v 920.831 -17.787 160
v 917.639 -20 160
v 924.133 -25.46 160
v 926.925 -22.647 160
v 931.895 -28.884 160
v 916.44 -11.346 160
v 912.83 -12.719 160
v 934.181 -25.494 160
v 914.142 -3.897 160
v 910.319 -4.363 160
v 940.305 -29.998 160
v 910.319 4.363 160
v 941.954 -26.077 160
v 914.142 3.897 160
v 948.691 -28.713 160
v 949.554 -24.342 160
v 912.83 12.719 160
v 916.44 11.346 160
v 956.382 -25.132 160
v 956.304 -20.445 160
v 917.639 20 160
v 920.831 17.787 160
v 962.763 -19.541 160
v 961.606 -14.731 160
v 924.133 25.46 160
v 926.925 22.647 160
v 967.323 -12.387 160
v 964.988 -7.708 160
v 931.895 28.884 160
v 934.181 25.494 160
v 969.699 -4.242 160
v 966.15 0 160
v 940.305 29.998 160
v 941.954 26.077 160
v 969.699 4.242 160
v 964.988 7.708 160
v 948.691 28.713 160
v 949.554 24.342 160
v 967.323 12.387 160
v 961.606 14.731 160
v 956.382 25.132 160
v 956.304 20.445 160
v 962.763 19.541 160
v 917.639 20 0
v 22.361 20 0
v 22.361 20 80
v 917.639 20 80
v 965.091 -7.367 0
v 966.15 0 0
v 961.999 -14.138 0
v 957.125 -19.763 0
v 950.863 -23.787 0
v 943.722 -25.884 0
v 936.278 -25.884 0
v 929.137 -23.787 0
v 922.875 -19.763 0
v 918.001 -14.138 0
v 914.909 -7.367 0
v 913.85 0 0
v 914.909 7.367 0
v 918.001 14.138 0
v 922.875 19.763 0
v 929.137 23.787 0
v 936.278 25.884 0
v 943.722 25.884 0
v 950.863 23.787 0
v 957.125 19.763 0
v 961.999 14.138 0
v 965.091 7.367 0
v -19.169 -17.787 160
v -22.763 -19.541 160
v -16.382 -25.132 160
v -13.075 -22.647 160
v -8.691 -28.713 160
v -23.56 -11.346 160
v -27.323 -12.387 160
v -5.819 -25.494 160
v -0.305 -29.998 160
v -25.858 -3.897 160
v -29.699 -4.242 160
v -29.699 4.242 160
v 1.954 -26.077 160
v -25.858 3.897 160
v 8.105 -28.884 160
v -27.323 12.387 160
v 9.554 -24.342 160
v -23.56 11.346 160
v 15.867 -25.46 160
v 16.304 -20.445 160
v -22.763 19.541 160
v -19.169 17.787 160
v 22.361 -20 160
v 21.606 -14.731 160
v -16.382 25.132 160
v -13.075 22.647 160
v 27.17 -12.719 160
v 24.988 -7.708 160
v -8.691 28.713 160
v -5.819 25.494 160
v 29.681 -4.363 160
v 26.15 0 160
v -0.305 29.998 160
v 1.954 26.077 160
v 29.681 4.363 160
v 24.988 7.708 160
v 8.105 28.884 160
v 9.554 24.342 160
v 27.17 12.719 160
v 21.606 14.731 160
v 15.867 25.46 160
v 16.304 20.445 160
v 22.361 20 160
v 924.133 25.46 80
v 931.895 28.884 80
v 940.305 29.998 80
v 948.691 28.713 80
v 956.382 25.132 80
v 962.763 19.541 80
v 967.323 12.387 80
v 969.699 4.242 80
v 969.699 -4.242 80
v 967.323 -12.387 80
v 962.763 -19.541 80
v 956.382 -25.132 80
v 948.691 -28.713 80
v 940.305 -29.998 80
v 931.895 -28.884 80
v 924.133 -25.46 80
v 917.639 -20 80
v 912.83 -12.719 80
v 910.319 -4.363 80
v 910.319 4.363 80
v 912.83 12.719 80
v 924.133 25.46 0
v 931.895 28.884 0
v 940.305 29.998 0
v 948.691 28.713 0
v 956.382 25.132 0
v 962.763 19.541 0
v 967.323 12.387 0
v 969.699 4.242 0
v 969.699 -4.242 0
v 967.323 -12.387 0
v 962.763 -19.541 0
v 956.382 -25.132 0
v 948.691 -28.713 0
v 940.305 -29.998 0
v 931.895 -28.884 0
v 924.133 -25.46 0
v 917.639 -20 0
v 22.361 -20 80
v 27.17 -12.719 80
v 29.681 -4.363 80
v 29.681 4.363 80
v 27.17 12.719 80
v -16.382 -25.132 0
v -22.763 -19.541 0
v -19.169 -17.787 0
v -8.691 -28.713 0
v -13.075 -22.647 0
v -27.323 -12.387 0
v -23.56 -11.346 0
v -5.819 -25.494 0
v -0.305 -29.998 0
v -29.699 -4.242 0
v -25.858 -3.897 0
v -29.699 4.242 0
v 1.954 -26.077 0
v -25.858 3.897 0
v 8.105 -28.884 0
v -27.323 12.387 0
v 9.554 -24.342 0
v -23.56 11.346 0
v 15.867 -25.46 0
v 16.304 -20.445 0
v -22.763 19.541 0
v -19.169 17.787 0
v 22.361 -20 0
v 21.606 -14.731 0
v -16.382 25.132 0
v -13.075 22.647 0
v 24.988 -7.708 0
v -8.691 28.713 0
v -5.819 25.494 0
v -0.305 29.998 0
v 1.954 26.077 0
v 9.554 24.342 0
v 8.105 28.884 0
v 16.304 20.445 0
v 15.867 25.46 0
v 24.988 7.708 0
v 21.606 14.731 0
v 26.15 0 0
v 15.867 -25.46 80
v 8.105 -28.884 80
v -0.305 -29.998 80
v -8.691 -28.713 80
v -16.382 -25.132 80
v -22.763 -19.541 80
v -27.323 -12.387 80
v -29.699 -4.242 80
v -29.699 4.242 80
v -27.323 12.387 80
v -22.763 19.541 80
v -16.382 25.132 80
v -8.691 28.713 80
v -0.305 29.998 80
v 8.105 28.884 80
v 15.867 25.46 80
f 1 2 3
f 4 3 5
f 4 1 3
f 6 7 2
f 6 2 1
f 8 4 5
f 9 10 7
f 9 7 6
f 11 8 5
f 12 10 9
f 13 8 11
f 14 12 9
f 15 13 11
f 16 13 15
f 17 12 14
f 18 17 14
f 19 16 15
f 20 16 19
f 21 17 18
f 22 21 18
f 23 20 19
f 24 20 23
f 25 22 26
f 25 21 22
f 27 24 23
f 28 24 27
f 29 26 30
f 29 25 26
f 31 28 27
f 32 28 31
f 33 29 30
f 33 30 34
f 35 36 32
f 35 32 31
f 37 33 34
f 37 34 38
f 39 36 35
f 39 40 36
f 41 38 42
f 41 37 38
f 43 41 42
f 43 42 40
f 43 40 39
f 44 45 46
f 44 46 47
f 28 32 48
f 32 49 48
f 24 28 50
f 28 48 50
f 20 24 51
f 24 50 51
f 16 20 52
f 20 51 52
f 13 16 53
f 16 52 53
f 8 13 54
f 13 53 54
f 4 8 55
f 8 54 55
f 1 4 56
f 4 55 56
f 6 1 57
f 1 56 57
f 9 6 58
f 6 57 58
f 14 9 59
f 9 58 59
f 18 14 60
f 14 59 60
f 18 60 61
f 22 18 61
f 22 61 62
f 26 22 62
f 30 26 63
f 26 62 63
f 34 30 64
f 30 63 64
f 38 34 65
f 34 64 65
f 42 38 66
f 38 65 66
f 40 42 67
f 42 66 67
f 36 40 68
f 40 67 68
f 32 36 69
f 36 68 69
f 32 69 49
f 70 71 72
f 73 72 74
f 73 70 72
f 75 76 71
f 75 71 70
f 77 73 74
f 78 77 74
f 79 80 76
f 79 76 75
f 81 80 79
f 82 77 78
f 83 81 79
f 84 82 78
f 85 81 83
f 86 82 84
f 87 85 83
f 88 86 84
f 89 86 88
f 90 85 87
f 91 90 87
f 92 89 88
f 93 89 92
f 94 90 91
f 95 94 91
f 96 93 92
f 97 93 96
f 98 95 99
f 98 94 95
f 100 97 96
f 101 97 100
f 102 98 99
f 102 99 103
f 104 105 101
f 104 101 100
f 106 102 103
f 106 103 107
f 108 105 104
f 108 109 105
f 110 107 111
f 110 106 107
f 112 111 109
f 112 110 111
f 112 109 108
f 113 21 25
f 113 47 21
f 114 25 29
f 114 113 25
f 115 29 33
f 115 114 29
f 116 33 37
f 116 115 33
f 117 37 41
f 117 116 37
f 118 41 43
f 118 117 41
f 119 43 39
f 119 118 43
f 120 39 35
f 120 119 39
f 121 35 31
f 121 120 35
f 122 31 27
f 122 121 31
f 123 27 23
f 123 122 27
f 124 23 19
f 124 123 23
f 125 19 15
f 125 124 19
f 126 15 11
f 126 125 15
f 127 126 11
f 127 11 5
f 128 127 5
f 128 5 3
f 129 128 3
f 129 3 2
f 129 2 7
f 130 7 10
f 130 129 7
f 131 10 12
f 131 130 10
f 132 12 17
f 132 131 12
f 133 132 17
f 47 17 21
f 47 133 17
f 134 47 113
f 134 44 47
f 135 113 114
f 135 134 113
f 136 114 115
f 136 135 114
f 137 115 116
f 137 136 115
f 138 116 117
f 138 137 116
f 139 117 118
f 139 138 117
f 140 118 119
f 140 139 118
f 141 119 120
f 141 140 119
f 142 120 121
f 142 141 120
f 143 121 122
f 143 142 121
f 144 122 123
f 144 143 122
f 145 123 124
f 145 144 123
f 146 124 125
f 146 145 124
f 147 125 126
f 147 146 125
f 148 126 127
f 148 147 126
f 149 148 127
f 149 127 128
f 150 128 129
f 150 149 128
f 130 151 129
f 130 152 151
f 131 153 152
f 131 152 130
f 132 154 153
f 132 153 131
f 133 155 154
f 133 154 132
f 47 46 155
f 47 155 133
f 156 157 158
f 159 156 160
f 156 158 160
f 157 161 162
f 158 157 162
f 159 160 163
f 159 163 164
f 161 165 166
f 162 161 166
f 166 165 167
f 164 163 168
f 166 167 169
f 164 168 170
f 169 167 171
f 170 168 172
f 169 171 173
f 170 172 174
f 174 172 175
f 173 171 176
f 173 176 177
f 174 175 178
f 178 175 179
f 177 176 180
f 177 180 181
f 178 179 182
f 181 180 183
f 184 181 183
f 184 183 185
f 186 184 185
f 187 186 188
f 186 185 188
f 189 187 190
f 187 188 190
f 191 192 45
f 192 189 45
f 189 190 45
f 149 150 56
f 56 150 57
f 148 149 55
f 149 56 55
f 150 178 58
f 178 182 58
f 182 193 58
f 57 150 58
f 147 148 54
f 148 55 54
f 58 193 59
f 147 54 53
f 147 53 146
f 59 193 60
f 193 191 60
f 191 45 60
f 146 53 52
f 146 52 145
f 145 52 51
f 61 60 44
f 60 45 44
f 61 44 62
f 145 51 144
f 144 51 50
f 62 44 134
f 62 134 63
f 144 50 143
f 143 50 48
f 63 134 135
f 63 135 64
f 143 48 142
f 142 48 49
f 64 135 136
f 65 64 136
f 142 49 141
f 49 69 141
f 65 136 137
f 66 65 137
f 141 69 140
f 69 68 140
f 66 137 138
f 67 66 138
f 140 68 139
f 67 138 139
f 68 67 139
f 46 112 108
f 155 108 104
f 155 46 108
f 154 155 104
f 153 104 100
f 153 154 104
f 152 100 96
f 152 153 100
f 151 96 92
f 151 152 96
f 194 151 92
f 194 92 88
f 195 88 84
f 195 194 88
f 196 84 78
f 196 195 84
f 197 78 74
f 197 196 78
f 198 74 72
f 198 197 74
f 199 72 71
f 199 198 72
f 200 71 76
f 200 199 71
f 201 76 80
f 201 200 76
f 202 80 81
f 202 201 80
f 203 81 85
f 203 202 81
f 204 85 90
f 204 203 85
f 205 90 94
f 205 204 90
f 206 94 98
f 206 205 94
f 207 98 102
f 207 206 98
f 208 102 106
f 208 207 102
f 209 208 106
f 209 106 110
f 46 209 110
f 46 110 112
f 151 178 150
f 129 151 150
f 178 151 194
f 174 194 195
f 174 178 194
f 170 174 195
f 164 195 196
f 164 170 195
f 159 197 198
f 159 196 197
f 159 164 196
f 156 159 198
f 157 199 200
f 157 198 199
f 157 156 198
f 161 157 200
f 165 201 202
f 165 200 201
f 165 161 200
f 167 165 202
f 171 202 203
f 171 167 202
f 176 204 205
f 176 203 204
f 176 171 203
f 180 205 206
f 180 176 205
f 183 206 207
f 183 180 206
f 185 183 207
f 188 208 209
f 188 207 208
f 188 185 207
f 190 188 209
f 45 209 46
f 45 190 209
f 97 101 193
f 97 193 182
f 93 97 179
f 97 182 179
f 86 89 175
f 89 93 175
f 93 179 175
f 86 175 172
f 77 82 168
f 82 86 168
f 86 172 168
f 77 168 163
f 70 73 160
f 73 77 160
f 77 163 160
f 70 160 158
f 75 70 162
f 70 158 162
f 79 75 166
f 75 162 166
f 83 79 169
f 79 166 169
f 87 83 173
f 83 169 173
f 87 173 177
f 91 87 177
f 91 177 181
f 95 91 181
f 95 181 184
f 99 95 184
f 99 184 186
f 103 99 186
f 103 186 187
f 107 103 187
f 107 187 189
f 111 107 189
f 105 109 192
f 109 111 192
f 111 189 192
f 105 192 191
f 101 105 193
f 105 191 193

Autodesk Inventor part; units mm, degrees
ref_plane "YZ Plane" through (0, 0, 0) normal (1, 0, 0) x (0, 1, 0)
ref_plane "XZ Plane" through (0, 0, 0) normal (0, 1, 0) x (-1, 0, 0)
ref_plane "XY Plane" through (0, 0, 0) normal (0, 0, 1) x (1, 0, 0)
sketch "Boceto1" plane through (0, 0, 0) normal (0, 0, 1) x (1, 0, 0)
  circle A0 centre (0, 0) radius 30
  circle A1 centre (0, 0) radius 26.15
  circle A2 centre (940, 0) radius 30
  circle A3 centre (940, 0) radius 26.15
  line L0 (22.3607, -20) -> (917.6393, -20)
  line L1 (26.15, 0) -> (30, 0)
  line L2 (910, 0) -> (940, 0)
  line L3 (22.3607, 20) -> (917.6393, 20)
  dimension "d1" = 52.3
  dimension "d0" = 60
  dimension "d2" = 940
  dimension "d3" = 60
  dimension "d4" = 52.3
extrude "Extrusión1" add sketch "Boceto1" along normal blind 80
sketch "Boceto2" plane through (0, 0, 80) normal (0, 0, 1) x (1, 0, 0)
  arc A0 (22.3607, 20) -> (22.3607, -20) centre (0, 0) ccw projected
  line L0 (22.3607, -20) -> (917.6393, -20) projected
  arc A1 (917.6393, -20) -> (917.6393, 20) centre (940, 0) ccw projected
  line L1 (917.6393, 20) -> (22.3607, 20) projected
  circle A2 centre (0, 0) radius 26.15 projected
  circle A3 centre (940, 0) radius 26.15 projected
  line L2 (917.6393, 20) -> (22.3607, 20) projected
  circle A4 centre (0, 0) radius 30
  circle A5 centre (940, 0) radius 30
  point P0 (22.3607, -20)
extrude "Extrusión2" add sketch "Boceto2" along normal blind 80 contours A4 A0 | A1 A5
properties part number "bocina1"
